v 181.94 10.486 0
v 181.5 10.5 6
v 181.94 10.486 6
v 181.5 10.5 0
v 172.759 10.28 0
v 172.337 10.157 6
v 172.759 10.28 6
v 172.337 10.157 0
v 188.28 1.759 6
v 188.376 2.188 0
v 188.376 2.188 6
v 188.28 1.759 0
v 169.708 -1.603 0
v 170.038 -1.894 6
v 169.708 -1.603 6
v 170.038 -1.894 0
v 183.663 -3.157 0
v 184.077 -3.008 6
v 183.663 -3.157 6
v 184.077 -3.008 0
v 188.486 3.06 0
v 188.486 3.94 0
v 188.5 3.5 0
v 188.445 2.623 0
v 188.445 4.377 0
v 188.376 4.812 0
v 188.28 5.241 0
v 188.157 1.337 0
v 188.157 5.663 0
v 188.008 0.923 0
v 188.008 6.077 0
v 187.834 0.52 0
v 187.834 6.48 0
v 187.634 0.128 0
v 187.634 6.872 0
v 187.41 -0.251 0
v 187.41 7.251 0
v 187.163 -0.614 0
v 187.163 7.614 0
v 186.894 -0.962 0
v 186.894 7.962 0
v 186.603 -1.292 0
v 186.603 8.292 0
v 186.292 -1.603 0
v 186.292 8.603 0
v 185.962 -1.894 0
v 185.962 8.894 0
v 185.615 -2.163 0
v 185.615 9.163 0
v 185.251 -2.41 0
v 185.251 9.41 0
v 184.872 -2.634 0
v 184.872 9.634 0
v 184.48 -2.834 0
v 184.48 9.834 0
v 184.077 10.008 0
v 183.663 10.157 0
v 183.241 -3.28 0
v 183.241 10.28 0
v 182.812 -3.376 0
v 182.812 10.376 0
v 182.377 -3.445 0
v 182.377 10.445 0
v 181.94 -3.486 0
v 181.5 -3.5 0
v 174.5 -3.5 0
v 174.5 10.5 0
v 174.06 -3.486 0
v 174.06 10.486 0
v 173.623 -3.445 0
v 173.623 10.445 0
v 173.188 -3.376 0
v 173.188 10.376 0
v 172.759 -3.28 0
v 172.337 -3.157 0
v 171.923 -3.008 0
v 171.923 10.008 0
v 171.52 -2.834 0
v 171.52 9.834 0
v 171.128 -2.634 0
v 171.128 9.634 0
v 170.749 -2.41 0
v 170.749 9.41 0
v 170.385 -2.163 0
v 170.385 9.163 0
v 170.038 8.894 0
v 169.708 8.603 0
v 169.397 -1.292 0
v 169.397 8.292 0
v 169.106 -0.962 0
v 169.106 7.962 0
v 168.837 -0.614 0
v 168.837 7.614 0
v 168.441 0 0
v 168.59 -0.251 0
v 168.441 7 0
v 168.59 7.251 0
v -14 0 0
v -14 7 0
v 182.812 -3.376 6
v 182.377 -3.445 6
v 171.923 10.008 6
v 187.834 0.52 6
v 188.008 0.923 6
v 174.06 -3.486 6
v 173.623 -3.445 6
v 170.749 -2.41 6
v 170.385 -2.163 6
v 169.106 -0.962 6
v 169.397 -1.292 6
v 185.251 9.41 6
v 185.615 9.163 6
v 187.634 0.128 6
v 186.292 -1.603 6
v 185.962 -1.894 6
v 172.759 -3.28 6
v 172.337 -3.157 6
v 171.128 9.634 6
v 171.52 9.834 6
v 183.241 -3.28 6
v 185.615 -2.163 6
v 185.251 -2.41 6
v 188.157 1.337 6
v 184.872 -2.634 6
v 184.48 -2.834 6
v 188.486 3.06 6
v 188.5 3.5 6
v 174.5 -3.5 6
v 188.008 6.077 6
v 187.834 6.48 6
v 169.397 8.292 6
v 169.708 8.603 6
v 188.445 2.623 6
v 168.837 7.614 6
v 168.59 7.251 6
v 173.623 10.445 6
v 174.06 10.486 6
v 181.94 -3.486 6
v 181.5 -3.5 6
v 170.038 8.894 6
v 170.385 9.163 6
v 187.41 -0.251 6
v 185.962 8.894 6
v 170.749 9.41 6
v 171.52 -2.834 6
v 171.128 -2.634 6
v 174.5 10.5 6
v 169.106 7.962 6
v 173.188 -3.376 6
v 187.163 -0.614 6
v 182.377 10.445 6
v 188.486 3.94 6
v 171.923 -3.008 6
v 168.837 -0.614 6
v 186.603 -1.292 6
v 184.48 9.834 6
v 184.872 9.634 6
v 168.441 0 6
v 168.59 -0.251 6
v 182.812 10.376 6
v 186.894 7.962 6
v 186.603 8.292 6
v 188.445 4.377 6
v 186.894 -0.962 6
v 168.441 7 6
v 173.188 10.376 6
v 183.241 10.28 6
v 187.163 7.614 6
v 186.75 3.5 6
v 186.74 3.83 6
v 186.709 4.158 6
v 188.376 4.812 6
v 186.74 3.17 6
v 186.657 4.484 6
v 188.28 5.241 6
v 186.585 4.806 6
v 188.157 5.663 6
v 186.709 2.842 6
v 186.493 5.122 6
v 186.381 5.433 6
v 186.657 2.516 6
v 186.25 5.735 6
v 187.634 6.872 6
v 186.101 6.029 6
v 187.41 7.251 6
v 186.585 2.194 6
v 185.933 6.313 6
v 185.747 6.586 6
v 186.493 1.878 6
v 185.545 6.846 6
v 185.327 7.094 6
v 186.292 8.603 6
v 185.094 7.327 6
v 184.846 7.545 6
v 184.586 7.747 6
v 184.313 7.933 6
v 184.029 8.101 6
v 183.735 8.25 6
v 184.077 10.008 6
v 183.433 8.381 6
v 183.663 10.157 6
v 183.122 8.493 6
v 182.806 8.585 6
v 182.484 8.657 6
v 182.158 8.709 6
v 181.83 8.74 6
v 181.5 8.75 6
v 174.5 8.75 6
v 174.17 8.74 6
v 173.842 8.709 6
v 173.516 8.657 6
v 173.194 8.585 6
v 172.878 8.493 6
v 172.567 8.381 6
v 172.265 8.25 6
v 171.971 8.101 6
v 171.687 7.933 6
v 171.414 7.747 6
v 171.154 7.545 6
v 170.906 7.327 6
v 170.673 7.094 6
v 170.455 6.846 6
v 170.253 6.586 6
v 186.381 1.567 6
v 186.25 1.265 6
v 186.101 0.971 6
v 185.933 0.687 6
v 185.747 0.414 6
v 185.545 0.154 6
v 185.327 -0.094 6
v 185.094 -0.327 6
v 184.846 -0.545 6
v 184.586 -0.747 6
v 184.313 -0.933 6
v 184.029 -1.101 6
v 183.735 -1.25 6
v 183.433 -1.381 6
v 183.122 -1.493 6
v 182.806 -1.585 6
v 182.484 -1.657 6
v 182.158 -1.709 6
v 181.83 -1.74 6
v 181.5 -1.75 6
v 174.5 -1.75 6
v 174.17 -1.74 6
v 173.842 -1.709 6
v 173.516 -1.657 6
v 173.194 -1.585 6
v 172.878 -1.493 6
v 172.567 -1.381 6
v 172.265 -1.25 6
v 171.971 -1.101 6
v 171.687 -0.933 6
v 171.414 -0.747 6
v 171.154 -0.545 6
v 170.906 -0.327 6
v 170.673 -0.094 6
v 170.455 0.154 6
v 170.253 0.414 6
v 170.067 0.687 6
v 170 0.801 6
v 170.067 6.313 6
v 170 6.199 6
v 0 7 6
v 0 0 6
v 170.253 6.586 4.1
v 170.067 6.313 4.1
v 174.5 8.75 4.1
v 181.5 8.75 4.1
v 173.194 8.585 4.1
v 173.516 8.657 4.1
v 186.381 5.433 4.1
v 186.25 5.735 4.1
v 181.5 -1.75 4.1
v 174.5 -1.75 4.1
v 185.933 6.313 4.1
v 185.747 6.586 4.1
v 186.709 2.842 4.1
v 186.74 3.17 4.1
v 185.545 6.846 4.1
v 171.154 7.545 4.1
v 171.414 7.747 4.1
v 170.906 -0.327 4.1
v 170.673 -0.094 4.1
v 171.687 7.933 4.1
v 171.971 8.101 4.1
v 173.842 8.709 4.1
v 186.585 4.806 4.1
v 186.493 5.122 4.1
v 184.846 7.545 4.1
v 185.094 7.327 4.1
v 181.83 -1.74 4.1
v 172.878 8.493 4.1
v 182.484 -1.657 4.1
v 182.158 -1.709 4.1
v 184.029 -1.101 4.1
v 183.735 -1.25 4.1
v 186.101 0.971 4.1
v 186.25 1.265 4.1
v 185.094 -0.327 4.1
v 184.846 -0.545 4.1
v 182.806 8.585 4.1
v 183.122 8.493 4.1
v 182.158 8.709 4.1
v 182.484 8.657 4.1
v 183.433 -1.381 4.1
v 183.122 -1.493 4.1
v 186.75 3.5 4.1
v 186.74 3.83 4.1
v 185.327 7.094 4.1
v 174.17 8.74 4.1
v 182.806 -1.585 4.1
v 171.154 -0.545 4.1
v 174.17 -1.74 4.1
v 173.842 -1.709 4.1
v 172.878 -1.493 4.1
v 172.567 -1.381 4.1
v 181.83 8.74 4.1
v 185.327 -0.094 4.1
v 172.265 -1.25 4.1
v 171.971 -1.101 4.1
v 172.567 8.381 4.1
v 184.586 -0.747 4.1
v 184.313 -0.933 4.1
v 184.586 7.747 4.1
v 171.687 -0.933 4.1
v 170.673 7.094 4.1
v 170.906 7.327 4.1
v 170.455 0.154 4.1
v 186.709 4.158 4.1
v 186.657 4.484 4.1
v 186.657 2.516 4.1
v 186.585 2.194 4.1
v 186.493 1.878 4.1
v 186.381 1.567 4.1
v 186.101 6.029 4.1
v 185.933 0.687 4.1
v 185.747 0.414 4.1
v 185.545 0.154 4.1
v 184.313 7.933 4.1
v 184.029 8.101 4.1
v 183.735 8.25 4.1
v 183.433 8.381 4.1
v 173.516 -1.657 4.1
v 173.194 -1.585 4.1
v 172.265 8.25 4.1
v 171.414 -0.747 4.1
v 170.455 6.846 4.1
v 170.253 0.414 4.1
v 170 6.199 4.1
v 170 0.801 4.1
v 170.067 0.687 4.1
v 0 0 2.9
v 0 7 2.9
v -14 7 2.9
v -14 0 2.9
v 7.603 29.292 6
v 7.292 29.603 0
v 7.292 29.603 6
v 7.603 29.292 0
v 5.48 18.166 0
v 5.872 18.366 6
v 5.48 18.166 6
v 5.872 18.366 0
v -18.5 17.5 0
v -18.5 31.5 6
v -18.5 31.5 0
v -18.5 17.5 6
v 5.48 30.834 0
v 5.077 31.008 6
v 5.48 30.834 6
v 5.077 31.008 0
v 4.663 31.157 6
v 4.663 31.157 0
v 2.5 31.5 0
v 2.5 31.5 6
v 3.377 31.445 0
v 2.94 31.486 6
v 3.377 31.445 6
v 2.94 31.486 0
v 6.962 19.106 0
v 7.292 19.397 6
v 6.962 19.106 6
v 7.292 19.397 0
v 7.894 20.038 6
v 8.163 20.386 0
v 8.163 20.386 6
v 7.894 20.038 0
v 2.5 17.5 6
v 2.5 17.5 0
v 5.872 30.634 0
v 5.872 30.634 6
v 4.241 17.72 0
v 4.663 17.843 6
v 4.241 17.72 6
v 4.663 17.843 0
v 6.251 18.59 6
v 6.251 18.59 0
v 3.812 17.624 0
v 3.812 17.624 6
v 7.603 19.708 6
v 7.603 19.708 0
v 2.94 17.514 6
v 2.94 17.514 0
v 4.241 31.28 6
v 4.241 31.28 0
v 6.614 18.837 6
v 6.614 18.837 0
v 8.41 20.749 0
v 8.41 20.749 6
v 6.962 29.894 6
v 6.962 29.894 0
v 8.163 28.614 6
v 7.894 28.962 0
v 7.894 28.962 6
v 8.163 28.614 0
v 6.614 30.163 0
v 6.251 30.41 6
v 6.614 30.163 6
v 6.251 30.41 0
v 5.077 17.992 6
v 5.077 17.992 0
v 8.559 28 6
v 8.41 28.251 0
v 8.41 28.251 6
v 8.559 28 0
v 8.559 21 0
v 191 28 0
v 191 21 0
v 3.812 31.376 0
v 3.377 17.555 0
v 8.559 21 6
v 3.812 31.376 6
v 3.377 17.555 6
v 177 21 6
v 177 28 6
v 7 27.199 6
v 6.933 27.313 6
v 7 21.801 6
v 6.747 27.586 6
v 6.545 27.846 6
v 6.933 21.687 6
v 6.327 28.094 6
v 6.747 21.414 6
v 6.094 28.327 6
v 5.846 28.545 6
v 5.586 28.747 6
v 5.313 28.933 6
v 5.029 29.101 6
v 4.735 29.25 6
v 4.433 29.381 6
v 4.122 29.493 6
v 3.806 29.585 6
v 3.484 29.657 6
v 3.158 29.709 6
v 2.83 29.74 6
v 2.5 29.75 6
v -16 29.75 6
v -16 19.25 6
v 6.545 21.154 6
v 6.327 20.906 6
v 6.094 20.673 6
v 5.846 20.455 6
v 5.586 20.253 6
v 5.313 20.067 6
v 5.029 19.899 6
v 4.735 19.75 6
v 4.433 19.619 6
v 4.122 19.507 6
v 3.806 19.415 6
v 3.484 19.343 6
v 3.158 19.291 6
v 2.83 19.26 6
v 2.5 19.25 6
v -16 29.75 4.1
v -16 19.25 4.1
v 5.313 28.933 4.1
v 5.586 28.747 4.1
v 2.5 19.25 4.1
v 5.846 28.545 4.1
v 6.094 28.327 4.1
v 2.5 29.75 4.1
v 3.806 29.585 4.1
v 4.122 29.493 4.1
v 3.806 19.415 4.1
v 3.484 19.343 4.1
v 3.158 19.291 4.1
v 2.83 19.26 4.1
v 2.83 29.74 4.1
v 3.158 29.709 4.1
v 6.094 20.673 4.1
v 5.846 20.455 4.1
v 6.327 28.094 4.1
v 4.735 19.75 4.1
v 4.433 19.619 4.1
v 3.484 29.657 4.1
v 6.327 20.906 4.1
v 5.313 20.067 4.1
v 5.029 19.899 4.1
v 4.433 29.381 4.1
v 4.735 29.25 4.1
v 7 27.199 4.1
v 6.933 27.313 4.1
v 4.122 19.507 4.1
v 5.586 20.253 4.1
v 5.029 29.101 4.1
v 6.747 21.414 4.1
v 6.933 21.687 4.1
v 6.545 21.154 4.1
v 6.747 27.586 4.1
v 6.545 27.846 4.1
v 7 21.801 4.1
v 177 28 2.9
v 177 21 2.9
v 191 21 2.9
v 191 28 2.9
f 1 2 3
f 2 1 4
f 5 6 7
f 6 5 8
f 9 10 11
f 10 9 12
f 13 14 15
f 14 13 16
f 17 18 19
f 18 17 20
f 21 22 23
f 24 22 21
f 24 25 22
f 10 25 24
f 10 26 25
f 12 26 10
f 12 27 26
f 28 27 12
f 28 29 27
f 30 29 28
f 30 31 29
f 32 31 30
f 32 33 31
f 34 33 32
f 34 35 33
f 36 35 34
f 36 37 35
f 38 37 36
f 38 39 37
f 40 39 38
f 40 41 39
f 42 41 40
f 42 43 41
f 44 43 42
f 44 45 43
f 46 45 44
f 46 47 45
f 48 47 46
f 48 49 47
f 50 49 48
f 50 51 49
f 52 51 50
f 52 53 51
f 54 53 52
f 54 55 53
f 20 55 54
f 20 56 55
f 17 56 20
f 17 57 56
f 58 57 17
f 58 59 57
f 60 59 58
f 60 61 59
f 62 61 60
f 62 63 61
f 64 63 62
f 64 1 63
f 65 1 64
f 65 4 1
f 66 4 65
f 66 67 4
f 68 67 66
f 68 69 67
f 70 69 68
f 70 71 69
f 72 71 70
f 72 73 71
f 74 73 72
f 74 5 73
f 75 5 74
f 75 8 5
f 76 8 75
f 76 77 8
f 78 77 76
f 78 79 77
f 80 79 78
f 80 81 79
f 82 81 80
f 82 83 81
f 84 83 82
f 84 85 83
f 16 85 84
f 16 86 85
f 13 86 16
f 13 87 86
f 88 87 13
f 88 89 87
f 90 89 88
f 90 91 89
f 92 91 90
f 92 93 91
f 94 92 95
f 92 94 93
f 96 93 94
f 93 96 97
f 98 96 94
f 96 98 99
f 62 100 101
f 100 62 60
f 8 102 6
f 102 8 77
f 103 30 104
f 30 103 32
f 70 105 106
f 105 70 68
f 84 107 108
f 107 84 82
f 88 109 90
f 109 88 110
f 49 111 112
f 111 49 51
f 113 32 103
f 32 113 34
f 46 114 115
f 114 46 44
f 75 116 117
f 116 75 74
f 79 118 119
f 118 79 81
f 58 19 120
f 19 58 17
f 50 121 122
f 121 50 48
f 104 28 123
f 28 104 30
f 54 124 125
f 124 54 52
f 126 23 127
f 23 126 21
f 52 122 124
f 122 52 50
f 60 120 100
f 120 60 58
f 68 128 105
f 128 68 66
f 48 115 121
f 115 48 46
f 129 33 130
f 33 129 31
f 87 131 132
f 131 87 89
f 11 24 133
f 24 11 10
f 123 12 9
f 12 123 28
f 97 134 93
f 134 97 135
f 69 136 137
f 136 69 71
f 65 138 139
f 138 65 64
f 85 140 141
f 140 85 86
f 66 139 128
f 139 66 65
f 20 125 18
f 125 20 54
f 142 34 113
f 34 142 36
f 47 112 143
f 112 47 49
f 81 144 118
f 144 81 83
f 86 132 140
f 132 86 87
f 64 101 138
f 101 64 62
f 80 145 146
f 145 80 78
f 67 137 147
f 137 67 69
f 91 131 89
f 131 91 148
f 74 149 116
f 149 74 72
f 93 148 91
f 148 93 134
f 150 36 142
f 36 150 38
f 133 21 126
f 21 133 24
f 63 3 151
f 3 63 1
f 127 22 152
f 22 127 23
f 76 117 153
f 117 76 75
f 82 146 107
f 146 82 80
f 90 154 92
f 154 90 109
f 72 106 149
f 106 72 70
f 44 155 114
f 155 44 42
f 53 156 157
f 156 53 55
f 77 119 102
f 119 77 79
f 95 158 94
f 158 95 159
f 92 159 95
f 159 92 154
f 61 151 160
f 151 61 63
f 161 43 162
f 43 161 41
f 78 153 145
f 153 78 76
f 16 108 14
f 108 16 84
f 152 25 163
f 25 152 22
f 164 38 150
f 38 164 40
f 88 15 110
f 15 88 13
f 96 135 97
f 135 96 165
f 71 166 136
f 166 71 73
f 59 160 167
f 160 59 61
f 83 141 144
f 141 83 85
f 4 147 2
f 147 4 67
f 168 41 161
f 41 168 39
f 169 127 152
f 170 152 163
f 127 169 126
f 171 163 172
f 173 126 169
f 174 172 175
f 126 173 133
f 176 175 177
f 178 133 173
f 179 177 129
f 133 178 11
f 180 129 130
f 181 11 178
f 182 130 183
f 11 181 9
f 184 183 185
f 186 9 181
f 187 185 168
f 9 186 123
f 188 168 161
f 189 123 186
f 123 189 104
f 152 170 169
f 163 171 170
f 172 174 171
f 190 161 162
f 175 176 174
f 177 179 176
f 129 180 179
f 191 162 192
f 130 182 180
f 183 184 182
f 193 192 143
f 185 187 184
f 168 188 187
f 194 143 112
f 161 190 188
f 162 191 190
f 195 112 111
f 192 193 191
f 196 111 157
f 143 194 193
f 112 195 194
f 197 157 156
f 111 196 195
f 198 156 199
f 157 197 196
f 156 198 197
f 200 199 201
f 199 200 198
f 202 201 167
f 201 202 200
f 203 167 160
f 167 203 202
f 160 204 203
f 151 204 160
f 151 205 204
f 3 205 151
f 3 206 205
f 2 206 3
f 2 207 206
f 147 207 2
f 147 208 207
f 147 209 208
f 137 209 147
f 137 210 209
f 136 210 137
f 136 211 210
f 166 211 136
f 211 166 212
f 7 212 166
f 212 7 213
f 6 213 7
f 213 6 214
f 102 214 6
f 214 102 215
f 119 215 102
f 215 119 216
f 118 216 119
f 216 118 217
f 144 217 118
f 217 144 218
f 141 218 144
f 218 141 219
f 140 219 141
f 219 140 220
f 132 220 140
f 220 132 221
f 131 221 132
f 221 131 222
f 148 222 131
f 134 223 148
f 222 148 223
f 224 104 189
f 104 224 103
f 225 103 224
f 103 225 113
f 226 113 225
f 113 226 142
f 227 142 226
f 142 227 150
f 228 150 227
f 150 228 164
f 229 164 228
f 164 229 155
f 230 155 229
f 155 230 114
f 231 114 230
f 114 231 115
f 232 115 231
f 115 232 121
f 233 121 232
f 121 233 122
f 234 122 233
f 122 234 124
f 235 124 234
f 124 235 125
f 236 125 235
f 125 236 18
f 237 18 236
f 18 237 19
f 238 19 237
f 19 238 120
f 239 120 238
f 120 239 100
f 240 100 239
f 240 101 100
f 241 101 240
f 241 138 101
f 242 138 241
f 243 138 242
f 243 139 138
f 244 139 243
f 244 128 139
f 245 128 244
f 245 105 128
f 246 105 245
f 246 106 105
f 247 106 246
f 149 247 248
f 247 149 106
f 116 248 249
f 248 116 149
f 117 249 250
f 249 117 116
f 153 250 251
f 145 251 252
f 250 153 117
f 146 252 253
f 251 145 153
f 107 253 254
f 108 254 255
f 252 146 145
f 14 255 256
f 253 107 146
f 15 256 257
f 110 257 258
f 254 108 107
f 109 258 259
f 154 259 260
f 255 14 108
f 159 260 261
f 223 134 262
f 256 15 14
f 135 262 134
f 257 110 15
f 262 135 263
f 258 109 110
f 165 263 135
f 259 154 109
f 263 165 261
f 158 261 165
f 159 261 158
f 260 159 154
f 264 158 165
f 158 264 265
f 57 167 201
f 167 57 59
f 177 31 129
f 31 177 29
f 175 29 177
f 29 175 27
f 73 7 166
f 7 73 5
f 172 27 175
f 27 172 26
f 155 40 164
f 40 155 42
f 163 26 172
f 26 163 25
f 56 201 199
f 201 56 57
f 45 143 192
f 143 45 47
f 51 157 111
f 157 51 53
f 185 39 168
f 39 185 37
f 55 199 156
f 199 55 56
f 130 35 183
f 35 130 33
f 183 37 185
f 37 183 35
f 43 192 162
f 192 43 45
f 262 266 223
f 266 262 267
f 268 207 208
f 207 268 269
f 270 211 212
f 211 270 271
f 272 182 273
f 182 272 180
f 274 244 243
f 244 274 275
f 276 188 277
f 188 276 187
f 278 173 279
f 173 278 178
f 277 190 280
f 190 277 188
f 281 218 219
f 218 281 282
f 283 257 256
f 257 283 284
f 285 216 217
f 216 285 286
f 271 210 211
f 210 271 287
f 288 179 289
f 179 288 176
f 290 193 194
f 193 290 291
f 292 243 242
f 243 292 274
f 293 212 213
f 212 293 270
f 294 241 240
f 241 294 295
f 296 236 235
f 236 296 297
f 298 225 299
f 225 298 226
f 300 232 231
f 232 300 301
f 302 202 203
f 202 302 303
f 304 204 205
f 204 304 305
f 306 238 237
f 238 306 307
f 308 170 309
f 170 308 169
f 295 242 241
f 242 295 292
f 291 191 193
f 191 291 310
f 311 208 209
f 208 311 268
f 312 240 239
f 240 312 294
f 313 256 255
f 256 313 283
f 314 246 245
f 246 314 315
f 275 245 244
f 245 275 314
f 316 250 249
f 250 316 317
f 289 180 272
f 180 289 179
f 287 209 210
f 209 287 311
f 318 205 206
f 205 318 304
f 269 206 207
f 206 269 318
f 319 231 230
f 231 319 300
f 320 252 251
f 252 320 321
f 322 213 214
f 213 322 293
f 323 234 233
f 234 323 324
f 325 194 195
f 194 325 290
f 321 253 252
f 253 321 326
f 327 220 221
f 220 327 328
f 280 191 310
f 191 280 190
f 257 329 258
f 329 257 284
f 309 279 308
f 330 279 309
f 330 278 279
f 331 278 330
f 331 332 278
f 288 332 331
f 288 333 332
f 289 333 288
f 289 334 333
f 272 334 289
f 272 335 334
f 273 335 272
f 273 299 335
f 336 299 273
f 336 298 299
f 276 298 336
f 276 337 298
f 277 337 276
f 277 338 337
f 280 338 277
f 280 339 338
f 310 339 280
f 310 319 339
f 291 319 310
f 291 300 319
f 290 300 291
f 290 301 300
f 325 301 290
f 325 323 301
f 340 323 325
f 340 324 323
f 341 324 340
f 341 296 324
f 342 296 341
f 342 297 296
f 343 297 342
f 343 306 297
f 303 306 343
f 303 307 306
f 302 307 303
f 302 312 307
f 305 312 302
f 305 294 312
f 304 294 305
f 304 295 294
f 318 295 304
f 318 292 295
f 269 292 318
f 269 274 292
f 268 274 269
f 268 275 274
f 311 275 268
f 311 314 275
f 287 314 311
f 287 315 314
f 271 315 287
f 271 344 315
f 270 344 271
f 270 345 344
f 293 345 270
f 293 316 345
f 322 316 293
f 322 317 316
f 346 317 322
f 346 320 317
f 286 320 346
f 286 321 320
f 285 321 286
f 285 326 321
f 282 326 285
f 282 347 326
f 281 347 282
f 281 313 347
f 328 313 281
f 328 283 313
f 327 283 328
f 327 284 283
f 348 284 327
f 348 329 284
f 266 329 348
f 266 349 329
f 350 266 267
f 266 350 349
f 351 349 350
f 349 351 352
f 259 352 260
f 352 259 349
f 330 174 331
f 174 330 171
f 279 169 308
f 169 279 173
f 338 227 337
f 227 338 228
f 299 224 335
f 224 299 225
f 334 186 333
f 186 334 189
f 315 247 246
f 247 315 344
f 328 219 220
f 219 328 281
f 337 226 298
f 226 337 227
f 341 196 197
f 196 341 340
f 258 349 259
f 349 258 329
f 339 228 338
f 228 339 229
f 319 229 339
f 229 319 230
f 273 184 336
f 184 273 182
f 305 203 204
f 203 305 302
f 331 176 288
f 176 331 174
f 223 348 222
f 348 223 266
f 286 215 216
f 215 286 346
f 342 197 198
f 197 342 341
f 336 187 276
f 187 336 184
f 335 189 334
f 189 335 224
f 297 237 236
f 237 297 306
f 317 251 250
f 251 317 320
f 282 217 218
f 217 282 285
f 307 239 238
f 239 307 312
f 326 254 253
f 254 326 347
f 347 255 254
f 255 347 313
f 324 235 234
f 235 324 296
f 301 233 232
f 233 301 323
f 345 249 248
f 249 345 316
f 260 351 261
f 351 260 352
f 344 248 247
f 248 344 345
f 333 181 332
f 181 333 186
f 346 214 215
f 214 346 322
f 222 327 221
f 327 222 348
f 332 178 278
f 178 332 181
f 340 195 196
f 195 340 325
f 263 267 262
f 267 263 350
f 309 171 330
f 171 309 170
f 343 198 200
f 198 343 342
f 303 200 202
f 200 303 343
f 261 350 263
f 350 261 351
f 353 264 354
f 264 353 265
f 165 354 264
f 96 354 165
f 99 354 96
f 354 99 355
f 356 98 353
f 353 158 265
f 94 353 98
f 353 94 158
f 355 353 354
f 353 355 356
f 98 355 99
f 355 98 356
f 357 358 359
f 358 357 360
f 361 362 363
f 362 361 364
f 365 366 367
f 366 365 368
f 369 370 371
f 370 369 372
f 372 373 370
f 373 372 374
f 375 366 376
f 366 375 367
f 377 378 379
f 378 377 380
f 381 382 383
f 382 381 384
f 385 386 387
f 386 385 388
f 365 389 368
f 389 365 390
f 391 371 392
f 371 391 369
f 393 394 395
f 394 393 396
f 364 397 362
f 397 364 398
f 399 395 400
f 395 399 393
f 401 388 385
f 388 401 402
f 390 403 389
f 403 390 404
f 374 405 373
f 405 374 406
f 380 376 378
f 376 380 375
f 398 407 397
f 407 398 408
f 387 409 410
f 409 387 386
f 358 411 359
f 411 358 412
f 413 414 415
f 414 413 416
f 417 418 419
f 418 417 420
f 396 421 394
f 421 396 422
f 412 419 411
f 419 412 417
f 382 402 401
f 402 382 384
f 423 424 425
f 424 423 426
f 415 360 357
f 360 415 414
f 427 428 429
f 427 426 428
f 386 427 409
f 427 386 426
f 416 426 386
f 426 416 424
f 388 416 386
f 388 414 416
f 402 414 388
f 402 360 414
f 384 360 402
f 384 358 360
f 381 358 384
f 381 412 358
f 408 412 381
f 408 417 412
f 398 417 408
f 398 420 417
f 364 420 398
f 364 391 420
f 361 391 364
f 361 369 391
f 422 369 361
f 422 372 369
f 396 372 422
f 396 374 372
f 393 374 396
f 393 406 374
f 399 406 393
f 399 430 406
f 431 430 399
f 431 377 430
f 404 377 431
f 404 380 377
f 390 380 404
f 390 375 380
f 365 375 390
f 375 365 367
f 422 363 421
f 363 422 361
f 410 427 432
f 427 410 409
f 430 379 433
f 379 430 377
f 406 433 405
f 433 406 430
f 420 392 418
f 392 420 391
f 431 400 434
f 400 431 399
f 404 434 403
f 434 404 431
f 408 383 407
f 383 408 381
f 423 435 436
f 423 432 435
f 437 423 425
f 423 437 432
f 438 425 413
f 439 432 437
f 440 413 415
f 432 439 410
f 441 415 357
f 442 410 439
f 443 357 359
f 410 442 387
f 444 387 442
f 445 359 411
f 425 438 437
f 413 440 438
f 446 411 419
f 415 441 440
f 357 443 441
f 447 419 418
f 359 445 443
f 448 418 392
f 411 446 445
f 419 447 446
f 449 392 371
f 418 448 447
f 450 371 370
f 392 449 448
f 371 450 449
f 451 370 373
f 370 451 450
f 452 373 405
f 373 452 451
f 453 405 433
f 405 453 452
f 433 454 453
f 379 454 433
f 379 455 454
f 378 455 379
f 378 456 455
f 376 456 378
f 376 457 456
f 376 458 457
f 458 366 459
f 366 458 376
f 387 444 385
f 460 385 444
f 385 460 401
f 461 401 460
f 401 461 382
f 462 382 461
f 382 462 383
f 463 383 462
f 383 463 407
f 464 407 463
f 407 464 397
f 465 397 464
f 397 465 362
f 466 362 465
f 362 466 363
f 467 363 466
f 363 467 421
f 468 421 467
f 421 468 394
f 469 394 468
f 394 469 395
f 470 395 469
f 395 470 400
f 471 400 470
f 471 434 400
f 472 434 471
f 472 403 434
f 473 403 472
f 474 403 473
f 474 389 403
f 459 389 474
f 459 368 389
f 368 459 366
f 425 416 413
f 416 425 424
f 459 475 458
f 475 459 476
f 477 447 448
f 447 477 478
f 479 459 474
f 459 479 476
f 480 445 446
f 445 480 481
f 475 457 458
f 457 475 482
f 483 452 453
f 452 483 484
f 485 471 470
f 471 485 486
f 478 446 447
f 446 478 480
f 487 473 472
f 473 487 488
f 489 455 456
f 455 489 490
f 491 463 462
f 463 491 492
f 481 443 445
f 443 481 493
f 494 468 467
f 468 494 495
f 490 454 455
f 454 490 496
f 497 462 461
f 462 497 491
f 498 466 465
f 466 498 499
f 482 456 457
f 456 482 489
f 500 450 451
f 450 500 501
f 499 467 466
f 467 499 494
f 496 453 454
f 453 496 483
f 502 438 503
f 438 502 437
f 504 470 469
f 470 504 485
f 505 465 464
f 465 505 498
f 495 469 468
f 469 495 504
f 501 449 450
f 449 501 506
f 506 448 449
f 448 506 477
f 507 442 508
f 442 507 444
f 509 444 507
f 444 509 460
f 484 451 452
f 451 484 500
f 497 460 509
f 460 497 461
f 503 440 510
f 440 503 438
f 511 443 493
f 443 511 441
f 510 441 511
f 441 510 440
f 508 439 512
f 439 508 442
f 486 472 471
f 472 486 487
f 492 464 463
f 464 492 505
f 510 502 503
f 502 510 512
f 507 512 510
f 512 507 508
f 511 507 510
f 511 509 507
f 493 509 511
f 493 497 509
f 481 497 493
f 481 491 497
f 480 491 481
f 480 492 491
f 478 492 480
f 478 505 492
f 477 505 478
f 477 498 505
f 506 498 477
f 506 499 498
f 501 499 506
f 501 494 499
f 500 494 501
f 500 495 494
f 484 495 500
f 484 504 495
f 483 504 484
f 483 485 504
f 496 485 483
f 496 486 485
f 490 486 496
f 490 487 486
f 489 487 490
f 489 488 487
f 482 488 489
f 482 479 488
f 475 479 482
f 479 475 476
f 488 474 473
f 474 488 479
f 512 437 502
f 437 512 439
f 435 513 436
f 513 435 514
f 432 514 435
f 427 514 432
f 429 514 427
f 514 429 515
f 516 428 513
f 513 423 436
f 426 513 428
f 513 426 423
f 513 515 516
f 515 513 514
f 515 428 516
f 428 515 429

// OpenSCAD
width = 170; // [50:300]
height = 6;  // [4:20]
depth = 7;   // [4:20]
UseCubicTip = "yes"; // [yes,no]
/* HIDDEN */
$fn=100;
CubicTip= (UseCubicTip=="yes");

P1(false);
translate([width+depth,depth*4])rotate(a=[0,0,180]) P1(CubicTip);

module P1(Cubic){    
    cS1 = depth*2;
    cS2 = depth*1.5;
    cube([width,depth,height]);
    translate([-depth*2,0])cube([depth*2,depth,height/2-0.1]);
    translate([width+depth-depth/2+1,depth/2]) difference(){
        hull(){
            cylinder(d=depth*2,h=height);
            if(Cubic) {translate([depth,-cS1/2]) cube([cS1,cS1,height]);}
            else {translate([depth,0]) cylinder(d=depth*2,h=height);}
        }
        translate([0,0,height*2/3+0.1]) hull(){
            cylinder(d=depth*1.5,h=height/3);
            if(Cubic) {translate([depth,-cS2/2]) cube([cS2+1,cS2,height/3]);}
            else {translate([depth,0]) cylinder(d=depth*1.5,h=height/3);}
        }
    }
}
